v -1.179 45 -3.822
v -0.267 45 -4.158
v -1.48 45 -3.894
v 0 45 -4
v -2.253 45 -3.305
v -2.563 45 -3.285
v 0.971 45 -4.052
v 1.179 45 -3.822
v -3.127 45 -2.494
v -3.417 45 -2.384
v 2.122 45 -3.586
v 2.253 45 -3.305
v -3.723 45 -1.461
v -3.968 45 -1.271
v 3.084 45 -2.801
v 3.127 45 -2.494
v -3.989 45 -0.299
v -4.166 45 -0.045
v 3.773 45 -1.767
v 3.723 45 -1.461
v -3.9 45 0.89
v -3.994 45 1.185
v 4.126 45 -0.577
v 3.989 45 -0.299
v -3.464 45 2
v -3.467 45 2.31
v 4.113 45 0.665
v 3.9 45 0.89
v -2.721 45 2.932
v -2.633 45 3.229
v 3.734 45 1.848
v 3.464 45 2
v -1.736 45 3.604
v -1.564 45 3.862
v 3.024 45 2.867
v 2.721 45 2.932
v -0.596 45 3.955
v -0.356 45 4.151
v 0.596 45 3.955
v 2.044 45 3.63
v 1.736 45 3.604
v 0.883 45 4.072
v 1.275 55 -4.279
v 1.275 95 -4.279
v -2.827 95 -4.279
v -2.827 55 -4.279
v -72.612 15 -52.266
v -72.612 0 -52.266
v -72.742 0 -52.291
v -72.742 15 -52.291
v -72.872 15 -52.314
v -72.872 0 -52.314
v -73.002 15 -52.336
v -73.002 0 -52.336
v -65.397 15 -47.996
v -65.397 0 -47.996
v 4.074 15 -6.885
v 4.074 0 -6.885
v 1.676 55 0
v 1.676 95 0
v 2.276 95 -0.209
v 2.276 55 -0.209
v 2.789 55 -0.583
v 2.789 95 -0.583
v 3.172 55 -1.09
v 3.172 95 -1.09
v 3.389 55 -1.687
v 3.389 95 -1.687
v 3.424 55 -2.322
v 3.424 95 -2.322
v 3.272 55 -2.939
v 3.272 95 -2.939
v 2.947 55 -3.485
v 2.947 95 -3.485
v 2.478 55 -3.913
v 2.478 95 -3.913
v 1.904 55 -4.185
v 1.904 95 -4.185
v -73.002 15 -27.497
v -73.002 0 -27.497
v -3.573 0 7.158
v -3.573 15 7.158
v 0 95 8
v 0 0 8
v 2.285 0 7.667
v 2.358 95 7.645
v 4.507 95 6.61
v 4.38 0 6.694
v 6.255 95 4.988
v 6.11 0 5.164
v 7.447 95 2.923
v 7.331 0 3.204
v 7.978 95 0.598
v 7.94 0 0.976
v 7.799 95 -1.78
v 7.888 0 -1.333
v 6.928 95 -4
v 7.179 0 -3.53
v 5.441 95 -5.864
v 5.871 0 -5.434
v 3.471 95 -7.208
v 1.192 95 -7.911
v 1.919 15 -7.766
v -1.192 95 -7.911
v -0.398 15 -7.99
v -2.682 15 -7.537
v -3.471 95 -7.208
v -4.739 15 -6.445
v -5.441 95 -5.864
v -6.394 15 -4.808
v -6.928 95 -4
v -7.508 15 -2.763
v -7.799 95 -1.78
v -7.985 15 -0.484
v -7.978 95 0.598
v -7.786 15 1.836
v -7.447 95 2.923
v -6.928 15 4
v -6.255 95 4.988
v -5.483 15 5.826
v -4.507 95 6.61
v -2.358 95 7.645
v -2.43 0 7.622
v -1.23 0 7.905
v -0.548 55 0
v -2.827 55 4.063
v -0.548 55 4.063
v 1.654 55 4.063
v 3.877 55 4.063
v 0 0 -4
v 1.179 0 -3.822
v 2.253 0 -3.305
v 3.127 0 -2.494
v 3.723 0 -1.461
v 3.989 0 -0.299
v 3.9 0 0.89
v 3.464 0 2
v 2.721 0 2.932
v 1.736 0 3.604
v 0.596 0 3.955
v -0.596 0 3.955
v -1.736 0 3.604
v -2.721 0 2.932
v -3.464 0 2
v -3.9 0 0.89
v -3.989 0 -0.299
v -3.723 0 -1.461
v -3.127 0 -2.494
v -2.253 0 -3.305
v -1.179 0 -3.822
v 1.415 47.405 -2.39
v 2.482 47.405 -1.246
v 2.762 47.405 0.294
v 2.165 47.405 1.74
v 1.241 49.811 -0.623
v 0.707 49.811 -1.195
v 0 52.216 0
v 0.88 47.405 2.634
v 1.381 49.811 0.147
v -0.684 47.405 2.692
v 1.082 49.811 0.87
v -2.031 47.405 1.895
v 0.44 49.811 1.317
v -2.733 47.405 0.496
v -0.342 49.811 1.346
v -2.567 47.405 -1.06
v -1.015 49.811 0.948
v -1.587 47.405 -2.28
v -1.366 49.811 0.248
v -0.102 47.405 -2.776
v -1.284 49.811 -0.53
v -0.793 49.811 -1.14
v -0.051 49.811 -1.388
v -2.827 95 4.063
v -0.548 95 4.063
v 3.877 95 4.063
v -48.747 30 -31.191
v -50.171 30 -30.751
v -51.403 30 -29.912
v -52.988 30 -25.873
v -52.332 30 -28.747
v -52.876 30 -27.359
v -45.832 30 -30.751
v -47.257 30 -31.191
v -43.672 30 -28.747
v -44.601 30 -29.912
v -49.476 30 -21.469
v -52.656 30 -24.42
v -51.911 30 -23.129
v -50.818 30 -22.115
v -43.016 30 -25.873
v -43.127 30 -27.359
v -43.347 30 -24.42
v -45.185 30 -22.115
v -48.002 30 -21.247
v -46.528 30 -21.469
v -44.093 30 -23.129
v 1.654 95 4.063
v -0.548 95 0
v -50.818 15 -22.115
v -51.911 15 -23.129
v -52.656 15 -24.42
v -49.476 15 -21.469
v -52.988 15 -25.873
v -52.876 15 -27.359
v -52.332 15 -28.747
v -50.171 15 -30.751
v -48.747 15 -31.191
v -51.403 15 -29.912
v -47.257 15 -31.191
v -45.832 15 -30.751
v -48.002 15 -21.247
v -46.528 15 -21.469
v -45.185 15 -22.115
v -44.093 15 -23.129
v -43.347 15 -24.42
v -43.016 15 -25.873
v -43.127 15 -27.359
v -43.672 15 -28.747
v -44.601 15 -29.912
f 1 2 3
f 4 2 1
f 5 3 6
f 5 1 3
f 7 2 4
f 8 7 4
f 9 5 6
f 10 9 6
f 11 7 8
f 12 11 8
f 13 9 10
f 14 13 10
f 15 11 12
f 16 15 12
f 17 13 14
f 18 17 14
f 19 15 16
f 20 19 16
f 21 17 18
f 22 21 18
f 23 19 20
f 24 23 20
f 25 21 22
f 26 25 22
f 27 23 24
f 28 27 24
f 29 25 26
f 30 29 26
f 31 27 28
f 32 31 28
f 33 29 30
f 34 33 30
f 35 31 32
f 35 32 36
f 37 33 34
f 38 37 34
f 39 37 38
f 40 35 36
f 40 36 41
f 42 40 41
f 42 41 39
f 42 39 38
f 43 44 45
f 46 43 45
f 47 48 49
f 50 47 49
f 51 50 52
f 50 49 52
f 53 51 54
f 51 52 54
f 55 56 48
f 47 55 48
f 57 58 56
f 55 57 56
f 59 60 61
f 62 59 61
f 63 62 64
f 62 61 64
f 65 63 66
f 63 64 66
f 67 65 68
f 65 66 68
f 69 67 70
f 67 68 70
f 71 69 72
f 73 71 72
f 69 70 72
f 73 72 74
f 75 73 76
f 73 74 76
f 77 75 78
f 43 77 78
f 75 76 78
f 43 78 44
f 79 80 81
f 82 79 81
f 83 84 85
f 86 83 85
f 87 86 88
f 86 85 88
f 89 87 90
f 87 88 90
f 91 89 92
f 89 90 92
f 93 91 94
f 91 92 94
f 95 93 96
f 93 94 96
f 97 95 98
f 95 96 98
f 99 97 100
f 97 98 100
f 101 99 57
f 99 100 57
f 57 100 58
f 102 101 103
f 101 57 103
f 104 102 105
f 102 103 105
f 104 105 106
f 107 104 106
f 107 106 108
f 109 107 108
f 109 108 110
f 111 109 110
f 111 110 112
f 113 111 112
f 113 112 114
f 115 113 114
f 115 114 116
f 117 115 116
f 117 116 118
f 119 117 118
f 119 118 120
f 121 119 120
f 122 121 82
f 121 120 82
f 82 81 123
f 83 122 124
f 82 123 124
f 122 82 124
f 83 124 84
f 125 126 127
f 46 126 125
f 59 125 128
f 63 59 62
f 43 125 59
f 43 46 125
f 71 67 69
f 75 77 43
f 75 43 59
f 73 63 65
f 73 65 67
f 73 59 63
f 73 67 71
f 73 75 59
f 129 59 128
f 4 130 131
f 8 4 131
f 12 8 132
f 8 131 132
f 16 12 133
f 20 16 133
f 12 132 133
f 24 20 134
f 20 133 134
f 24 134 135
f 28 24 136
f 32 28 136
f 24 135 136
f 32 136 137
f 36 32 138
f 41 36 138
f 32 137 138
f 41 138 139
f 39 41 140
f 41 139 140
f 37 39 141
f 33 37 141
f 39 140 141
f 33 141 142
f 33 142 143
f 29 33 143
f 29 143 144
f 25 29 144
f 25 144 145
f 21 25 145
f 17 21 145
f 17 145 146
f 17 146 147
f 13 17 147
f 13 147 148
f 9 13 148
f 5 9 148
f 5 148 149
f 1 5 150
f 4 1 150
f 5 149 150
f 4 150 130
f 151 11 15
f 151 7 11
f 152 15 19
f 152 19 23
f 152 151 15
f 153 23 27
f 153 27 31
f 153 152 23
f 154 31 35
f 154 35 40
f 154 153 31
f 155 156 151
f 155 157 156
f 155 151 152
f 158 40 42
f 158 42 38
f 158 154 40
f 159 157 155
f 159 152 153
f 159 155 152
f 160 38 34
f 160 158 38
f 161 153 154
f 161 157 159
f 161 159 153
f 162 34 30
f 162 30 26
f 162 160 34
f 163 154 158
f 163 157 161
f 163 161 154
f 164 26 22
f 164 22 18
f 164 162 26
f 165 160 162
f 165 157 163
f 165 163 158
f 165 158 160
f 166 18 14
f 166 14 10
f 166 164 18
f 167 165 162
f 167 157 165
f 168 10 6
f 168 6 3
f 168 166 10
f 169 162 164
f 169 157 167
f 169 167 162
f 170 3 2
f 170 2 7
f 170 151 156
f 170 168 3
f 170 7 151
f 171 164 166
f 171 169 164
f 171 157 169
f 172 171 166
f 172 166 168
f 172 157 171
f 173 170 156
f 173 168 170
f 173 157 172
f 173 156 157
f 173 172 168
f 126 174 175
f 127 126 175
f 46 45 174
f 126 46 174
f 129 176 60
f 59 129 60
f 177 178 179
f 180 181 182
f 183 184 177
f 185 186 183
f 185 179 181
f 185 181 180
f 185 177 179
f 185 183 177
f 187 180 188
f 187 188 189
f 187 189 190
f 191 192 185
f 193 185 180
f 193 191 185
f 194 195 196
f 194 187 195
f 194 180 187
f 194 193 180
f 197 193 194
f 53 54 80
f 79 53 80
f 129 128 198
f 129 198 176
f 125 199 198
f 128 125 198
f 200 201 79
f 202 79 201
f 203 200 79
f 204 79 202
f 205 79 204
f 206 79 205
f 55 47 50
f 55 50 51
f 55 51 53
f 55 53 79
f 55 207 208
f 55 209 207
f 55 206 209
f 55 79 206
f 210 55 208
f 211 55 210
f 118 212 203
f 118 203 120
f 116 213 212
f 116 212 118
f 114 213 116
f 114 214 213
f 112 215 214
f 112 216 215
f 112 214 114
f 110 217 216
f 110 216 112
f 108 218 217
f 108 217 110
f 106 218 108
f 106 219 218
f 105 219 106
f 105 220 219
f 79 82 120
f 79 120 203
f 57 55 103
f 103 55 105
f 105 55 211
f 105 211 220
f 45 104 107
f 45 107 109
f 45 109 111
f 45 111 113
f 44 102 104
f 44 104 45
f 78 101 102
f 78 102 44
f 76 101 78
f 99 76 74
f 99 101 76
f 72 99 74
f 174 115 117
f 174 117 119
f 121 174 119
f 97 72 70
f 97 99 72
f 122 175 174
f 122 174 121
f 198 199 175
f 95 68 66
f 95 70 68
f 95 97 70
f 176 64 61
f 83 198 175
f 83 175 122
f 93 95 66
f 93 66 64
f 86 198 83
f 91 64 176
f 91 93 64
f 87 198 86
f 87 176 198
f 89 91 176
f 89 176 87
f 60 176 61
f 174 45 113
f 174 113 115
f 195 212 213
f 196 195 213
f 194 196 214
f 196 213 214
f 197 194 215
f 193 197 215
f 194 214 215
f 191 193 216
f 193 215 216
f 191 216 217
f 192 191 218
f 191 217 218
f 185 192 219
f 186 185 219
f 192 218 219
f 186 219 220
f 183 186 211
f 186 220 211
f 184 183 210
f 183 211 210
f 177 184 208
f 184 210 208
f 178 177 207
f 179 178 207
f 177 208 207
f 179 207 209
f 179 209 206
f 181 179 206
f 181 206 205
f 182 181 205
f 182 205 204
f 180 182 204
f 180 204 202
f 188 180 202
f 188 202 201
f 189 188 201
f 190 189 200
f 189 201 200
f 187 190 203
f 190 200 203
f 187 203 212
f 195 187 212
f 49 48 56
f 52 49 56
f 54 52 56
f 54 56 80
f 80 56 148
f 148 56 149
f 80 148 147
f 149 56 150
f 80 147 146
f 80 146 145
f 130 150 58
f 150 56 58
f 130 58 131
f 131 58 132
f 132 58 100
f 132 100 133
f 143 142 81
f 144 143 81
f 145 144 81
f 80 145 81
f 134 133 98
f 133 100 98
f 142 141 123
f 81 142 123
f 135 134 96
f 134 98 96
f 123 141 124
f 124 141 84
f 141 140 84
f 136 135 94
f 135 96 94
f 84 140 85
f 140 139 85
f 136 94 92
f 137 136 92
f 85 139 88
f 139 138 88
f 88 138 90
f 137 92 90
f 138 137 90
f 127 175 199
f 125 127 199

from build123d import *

# Parameters (mm, degrees)
SKETCH1_R           = 8
BOSS_EXTRUDE1_DEPTH = 95
SKETCH2_R           = 4
CUT_EXTRUDE1_DEPTH  = 45
SKETCH4_W           = 2.279315198
SKETCH4_H           = 4.278597429
SKETCH4_H_2         = 4.06286311
CUT_EXTRUDE2_DEPTH  = 40
BOSS_EXTRUDE2_DEPTH = 15
SKETCH6_R           = 5
BOSS_EXTRUDE3_DEPTH = 15


with BuildPart() as part:
    # Sketch1 → Boss-Extrude1 (new body)
    with BuildSketch(Plane(origin=(0, 0, 0), x_dir=(1, 0, 0), z_dir=(0, 1, 0))):
        with Locations(Location((0, 0, 0), (0, 0, 270))):
            Circle(SKETCH1_R)
    extrude(amount=BOSS_EXTRUDE1_DEPTH)

    # Sketch2 → Cut-Extrude1 (cut)
    with BuildSketch(Plane.XZ):
        with Locations(Location((0, 0, 0), (0, 0, 270))):
            Circle(SKETCH2_R)
    extrude(amount=-CUT_EXTRUDE1_DEPTH, mode=Mode.SUBTRACT)

    # Sketch4 → Cut-Extrude2 (cut)
    with BuildSketch(Plane(origin=(0, 95, 0), x_dir=(1, 0, 0), z_dir=(0, 1, 0))):
        with BuildLine():
            Line((1.275256108, 4.278597429), (-0.547648504, 4.278597429))
            Line((-0.547648504, 4.278597429), (-0.547648504, 0))
            Line((-0.547648504, 0), (1.67579289, 0))
            ThreePointArc((1.67579289, 0), (3.423908341, 2.321694794), (1.275256108, 4.278597429))
        make_face()
        with Locations((-1.687306103, 2.139298715)):
            Rectangle(SKETCH4_W, SKETCH4_H)
        with Locations((-1.687306103, -2.031431555)):
            Rectangle(SKETCH4_W, SKETCH4_H_2)
        Polygon((1.67579289, 0), (-0.547648504, 0), (1.653720681, -4.06286311), (3.877162075, -4.06286311), align=None)
    extrude(amount=-CUT_EXTRUDE2_DEPTH, mode=Mode.SUBTRACT)

    # Sketch5 → Boss-Extrude2 (add)
    with BuildSketch(Plane(origin=(0, 0, 0), x_dir=(1, 0, 0), z_dir=(0, 1, 0))):
        with BuildLine():
            ThreePointArc((-62.501736138, 39.996744571), (-65.482019756, 31.895818698), (-73.001736138, 27.657781892))
            Line((-73.001736138, 27.657781892), (-73.001736138, 27.496744571))
            Line((-73.001736138, 27.496744571), (-3.57279106, -7.157874268))
            ThreePointArc((-3.57279106, -7.157874268), (-7.025809748, 3.825963588), (4.074261757, 6.884794197))
            Line((4.074261757, 6.884794197), (-65.396568509, 47.996166726))
            ThreePointArc((-65.396568509, 47.996166726), (-63.247702886, 44.250296301), (-62.501736138, 39.996744571))
        make_face()
        with BuildLine():
            ThreePointArc((-72.612195867, 52.266222852), (-72.806691043, 52.302506515), (-73.001736138, 52.33570725))
            Line((-73.001736138, 52.33570725), (-73.001736138, 27.657781892))
            ThreePointArc((-73.001736138, 27.657781892), (-65.482019756, 31.895818698), (-62.501736138, 39.996744571))
            ThreePointArc((-62.501736138, 39.996744571), (-63.247702886, 44.250296301), (-65.396568509, 47.996166726))
            Line((-65.396568509, 47.996166726), (-72.612195867, 52.266222852))
        make_face()
    extrude(amount=BOSS_EXTRUDE2_DEPTH)

    # Sketch6 → Boss-Extrude3 (add)
    with BuildSketch(Plane(origin=(0, 15, 0), x_dir=(1, 0, 0), z_dir=(0, 1, 0))):
        with Locations(Location((-48.001736138, 26.246610631, 0), (0, 0, 270))):
            Circle(SKETCH6_R)
    extrude(amount=BOSS_EXTRUDE3_DEPTH)

    # Sketch8 → Cut-Revolve1 (revolve, cut)
    with BuildSketch(Plane(origin=(0, 0, 0), x_dir=(-0.4149509310359906, 0, 0.909843791445743), z_dir=(0.909843791445743, 0, 0.4149509310359906)), mode=Mode.PRIVATE) as cut_revolve1_sk:
        Polygon((0, -45), (-4.166361625, -45), (0, -52.216350017), align=None)
    revolve(cut_revolve1_sk.sketch.rotate(Axis((0, 52.216350017, 0), (0, -1, 0)), 6.099837448), axis=Axis((0, 52.216350017, 0), (0, -1, 0)), mode=Mode.SUBTRACT)


solid = part.part
